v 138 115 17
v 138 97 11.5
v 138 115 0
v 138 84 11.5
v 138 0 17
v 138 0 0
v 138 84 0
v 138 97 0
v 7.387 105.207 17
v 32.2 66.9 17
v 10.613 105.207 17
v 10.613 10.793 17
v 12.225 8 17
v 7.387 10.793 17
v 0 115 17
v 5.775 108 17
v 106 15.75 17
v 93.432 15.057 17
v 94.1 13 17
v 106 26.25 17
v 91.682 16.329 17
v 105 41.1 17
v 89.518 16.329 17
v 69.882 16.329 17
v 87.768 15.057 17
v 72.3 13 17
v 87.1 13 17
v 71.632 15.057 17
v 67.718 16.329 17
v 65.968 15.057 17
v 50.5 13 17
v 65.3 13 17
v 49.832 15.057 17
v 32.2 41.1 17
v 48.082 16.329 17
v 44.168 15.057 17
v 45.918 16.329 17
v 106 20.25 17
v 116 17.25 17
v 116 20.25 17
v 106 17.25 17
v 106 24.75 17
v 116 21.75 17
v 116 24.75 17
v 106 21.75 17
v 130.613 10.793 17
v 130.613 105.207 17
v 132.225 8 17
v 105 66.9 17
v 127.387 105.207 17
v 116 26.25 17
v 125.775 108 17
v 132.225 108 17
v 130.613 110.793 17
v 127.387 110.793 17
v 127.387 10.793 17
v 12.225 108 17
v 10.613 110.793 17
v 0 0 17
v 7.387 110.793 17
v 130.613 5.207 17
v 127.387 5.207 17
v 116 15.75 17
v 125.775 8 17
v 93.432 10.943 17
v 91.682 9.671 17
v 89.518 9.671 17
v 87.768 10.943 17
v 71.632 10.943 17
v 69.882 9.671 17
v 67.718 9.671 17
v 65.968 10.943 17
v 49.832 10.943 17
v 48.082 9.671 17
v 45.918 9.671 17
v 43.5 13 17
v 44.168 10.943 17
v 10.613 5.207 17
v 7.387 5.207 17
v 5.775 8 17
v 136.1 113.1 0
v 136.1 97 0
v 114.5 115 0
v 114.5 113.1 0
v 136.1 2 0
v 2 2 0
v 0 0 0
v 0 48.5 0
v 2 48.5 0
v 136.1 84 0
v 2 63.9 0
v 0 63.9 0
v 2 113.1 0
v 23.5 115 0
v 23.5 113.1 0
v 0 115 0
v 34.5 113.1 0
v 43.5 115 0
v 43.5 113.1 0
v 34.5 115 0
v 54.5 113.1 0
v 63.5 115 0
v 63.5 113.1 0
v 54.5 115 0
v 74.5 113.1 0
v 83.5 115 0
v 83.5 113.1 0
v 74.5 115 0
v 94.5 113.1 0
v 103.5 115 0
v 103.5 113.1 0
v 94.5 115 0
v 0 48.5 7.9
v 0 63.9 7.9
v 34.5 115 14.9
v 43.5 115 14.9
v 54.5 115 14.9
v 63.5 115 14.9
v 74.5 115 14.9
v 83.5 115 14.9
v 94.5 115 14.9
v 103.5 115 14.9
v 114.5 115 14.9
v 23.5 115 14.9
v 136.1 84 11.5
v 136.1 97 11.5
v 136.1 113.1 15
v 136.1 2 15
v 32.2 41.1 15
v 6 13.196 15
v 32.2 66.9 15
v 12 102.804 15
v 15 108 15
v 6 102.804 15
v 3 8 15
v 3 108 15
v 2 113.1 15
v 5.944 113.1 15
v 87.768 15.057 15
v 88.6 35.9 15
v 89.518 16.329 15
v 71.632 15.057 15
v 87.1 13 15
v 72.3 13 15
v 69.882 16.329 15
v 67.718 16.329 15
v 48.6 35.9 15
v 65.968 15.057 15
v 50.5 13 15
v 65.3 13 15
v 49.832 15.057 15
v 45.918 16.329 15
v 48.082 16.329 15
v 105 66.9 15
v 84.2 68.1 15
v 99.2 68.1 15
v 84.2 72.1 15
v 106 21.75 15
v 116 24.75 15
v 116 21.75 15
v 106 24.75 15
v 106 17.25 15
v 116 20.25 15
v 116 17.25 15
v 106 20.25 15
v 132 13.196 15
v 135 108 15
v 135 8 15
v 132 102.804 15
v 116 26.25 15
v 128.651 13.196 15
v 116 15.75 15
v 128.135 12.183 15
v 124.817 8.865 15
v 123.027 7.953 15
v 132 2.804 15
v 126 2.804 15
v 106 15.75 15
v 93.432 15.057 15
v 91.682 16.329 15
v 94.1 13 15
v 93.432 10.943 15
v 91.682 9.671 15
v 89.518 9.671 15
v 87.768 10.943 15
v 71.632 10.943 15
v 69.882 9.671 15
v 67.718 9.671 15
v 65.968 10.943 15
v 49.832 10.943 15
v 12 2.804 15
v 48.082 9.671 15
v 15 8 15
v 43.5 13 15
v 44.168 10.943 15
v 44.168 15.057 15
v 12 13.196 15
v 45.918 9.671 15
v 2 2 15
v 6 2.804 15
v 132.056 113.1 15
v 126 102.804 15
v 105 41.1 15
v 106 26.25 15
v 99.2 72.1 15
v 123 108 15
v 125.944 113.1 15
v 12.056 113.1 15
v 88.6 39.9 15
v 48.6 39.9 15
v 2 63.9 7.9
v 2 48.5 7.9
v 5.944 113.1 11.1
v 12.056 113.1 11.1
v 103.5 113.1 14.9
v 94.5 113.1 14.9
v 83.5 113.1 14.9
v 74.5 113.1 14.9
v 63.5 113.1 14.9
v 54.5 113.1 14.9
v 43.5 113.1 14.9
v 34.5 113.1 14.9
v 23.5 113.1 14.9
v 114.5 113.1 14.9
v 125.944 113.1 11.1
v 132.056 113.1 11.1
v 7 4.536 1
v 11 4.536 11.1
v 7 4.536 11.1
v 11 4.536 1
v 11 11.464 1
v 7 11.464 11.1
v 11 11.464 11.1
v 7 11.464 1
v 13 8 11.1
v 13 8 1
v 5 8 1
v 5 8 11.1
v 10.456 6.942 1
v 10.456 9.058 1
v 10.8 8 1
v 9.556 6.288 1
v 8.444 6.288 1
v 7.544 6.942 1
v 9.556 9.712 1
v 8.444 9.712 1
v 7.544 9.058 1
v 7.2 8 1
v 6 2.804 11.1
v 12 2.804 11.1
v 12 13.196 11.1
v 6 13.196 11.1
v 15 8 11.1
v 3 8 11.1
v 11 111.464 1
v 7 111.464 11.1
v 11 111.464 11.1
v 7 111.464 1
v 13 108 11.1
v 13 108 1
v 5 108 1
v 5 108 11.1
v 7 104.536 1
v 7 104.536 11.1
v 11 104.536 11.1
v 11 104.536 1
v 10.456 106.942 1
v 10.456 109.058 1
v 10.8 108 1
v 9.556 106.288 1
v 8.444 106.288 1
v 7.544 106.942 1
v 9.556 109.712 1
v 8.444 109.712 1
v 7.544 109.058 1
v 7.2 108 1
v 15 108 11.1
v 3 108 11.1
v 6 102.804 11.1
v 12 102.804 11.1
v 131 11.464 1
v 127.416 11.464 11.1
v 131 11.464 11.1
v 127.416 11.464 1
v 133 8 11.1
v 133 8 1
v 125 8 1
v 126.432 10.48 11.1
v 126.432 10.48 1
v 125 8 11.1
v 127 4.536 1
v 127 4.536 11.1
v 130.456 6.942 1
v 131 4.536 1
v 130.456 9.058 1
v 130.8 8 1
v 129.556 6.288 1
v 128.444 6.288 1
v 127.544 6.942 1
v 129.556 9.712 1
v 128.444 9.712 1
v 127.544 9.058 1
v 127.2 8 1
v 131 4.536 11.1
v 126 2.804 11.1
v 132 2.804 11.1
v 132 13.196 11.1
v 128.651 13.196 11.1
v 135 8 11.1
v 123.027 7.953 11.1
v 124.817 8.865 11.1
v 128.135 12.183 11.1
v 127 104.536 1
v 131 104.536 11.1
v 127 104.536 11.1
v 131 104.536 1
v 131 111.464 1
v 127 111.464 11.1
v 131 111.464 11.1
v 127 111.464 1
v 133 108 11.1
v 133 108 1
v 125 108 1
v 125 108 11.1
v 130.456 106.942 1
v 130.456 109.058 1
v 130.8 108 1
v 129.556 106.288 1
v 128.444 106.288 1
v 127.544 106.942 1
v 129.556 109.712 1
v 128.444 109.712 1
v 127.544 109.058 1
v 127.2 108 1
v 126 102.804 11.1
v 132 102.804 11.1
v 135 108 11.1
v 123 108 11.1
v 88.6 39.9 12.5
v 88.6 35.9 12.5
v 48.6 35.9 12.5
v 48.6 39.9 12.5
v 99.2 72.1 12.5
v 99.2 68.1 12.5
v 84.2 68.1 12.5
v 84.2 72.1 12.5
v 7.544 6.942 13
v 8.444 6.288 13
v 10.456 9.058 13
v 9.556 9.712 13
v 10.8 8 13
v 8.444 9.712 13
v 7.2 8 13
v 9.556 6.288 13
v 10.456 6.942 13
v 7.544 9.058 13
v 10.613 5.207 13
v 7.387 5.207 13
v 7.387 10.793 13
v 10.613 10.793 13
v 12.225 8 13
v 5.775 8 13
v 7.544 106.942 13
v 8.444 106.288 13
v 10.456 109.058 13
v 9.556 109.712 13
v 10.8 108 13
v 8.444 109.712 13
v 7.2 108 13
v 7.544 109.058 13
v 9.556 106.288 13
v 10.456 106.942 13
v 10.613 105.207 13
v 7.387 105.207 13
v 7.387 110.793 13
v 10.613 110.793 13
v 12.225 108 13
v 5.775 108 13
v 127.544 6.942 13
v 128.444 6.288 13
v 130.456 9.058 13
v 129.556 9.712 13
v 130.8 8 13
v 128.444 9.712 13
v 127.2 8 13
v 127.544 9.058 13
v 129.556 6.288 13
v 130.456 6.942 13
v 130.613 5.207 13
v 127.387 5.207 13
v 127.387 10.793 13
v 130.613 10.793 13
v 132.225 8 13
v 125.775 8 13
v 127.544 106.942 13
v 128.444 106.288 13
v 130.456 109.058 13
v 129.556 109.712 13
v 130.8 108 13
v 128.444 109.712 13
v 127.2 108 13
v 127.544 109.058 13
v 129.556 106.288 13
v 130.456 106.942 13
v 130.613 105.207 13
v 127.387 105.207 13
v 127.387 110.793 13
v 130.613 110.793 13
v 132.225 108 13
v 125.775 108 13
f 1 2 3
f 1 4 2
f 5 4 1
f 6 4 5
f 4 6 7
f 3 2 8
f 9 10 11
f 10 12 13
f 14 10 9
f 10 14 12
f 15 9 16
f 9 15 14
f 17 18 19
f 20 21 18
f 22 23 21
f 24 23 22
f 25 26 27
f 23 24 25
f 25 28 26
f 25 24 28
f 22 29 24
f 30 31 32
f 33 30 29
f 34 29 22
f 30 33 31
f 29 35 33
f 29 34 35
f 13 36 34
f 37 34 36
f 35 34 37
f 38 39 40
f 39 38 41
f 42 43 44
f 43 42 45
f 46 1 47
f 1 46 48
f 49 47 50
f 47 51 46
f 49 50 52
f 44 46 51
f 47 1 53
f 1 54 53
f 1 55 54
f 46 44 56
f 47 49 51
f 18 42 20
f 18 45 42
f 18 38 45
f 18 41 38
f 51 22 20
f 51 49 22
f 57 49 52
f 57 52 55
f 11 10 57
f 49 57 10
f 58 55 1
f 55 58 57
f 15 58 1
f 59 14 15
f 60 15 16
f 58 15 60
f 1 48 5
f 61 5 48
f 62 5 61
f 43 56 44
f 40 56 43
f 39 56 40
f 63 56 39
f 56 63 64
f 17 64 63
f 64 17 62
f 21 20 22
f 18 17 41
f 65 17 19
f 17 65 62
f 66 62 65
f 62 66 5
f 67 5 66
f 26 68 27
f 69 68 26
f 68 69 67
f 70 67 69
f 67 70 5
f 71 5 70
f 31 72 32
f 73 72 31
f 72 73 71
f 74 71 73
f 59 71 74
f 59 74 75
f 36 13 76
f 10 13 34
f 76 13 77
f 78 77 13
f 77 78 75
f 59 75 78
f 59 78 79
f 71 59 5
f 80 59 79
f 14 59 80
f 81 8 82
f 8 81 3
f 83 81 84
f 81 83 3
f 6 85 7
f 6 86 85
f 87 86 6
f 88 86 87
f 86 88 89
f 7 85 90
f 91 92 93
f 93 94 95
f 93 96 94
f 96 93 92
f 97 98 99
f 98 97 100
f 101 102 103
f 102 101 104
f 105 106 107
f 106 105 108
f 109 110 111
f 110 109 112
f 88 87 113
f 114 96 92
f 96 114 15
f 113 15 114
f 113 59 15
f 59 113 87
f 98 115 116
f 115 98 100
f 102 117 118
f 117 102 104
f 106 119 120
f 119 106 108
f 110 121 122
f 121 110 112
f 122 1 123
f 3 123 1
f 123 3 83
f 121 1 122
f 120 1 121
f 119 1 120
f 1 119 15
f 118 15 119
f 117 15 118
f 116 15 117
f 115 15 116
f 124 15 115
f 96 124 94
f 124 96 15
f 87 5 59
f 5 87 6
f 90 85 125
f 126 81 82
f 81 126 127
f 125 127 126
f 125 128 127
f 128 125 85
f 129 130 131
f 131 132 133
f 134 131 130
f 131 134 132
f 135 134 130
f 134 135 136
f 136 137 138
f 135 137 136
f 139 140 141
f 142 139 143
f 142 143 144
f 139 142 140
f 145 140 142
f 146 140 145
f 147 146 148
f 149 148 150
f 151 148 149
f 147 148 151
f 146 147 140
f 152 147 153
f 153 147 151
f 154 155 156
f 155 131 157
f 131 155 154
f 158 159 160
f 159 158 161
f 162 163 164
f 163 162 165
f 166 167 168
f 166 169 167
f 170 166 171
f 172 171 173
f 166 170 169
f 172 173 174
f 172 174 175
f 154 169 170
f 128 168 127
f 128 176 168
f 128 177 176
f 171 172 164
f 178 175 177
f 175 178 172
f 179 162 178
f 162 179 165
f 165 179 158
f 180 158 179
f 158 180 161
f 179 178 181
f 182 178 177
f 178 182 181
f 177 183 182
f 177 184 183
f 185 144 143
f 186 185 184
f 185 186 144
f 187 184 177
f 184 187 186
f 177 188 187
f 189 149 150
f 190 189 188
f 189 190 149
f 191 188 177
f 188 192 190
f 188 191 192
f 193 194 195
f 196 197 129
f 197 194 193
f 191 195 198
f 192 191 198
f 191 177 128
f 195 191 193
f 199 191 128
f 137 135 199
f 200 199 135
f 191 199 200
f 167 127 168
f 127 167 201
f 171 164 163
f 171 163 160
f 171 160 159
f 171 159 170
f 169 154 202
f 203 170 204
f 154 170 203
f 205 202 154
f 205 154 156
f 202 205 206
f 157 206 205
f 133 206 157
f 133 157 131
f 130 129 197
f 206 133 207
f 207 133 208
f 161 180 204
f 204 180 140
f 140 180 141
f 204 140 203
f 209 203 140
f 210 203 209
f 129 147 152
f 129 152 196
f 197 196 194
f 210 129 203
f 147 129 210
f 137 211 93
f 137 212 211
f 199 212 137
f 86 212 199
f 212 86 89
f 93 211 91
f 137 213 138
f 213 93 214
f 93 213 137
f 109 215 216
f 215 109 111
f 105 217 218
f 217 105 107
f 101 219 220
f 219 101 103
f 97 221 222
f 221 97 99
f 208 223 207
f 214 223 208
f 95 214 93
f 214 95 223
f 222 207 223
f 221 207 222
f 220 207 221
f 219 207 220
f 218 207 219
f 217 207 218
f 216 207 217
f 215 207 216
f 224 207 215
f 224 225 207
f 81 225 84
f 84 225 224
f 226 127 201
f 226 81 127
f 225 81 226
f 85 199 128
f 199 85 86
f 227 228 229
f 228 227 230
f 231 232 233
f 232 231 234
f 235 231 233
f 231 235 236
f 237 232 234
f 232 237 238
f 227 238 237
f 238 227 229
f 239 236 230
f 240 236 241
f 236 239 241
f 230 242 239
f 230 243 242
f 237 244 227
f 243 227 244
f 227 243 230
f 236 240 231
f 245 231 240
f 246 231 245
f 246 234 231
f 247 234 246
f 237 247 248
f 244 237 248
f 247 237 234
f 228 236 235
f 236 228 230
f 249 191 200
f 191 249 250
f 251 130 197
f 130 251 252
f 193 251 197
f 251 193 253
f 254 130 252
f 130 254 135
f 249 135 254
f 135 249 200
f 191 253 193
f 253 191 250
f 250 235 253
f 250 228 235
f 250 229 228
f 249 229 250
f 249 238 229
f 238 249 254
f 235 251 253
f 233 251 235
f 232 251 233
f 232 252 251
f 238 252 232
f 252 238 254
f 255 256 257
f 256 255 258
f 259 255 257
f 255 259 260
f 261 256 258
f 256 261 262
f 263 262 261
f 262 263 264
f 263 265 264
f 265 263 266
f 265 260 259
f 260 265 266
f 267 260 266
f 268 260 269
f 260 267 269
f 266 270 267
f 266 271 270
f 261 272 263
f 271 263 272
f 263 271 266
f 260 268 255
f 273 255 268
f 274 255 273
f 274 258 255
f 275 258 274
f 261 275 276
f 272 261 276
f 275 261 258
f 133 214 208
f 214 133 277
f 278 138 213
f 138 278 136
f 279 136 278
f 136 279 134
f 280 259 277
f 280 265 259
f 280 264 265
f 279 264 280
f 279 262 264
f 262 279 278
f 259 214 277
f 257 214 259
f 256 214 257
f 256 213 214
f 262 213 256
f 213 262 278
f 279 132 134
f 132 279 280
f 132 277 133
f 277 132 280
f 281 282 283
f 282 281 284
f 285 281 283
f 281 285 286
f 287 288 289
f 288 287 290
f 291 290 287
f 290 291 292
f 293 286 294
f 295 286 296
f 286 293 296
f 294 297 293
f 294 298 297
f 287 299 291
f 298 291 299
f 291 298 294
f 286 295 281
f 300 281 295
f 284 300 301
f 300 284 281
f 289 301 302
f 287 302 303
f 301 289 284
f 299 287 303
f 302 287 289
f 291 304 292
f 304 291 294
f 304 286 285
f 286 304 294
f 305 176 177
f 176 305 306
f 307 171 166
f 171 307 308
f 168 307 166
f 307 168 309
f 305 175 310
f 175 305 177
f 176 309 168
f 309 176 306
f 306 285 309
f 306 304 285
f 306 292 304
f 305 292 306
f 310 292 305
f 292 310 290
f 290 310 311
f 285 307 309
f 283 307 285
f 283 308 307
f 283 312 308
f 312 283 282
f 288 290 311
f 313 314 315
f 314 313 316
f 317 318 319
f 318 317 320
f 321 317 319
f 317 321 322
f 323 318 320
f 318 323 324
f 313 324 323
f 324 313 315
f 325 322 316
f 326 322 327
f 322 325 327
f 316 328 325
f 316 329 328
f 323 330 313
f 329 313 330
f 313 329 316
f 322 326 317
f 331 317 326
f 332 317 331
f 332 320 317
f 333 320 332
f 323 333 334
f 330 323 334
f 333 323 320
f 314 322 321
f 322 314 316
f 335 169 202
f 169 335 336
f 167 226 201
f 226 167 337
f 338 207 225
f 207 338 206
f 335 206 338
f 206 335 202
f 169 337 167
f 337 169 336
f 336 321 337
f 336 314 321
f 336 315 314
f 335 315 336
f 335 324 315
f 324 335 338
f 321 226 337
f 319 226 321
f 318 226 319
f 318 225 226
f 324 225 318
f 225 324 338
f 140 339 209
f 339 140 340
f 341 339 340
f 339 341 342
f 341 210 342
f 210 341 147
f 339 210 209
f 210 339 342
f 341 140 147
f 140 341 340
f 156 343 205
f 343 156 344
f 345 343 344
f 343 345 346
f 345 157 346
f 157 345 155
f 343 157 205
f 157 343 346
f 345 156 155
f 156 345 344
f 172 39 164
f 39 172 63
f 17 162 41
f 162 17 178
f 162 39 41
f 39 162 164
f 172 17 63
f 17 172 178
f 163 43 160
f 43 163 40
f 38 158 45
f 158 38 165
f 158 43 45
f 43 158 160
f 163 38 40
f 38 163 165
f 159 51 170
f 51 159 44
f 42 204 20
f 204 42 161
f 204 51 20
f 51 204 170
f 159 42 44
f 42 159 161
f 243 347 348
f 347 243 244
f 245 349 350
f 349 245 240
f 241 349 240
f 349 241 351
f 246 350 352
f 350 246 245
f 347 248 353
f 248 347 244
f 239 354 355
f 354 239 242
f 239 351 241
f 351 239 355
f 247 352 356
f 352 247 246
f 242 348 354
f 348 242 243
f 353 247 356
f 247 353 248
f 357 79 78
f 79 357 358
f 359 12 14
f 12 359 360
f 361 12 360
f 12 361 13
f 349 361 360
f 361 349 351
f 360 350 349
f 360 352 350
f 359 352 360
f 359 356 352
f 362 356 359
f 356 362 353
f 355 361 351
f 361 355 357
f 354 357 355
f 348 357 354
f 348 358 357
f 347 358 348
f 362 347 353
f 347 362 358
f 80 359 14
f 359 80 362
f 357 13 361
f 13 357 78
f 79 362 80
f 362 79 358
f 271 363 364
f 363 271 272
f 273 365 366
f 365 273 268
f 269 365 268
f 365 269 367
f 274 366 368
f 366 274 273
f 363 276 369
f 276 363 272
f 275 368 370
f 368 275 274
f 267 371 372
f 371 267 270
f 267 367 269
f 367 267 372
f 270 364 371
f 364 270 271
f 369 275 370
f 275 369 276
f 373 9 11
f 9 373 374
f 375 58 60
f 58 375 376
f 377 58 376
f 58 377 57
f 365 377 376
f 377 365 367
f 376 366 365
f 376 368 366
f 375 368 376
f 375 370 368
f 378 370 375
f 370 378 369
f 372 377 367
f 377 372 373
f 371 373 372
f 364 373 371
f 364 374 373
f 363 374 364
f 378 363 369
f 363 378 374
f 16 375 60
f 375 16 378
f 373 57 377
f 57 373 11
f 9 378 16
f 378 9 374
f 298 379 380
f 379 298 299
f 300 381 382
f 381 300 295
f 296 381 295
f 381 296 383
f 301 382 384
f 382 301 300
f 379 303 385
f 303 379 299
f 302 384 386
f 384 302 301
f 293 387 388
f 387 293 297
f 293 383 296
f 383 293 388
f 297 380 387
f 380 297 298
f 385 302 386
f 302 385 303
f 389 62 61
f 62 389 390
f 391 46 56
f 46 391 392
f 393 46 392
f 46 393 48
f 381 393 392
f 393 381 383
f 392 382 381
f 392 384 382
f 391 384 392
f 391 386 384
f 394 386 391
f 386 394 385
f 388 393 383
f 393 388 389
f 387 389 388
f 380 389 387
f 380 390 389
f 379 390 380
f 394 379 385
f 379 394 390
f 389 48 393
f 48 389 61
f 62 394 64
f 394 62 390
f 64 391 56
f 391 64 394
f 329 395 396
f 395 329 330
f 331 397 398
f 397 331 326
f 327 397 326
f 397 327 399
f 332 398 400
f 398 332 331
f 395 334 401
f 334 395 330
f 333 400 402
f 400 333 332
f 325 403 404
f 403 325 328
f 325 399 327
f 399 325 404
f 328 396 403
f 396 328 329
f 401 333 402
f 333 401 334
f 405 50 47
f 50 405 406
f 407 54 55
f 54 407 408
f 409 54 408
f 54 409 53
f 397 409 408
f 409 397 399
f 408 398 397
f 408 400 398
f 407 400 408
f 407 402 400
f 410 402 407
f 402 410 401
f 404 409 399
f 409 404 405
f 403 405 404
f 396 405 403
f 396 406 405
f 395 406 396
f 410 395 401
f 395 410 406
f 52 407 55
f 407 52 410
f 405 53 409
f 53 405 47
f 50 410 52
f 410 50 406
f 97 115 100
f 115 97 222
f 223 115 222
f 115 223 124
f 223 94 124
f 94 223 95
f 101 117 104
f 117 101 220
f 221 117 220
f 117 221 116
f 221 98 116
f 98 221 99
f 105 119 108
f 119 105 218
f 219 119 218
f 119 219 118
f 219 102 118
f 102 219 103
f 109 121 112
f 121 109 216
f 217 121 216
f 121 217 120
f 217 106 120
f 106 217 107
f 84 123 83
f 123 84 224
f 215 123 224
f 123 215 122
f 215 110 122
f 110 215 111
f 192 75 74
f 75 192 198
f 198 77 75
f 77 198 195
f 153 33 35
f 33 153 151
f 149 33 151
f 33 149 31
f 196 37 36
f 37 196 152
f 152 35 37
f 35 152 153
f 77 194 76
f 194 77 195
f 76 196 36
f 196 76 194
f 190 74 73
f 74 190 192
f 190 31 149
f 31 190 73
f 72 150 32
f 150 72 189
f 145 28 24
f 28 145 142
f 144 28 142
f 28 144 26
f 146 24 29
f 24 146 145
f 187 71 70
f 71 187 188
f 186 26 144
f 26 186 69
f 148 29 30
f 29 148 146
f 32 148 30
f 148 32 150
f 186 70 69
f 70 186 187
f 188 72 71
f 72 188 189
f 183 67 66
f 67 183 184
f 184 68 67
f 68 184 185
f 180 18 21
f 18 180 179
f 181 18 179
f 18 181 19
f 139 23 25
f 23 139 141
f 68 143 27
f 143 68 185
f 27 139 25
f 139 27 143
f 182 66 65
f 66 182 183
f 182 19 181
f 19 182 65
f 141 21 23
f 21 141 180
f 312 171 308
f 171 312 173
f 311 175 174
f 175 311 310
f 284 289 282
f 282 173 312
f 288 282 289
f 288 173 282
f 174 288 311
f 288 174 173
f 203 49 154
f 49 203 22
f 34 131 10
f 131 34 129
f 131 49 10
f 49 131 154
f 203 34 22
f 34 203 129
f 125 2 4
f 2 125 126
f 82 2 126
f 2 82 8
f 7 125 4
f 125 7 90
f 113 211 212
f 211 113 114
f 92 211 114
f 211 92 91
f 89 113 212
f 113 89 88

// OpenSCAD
tol = 0.5;
screen_tol = 0.8;
pcb_x = 130;
pcb_y = 110;
pcb_z = 4;
bolt_d = 3.6;
shift_bolt = 5;

// box thickness
th = 2;

shift_x = 4;
shift_y = th + 1;

box_x = pcb_x + shift_x + 4;
box_y = pcb_y + shift_y + th;

pcb_width = 2;
pcb_up = 9;

box_z = th + pcb_up + pcb_width - 1;

socket_h = 15;
socket_w = 10;
socket_n = 5;
socket_int = 20;
start_socket_x = 20 + shift_x;
eps = 1e-1;

usb_type_b_w = 12;
usb_type_b_h = 11;
start_type_b_y = shift_y + 81.5;
//start_type_b_z = th + pcb_z + tol;

usb_type_a_w = 14.4;
usb_type_a_h = 7.8;
start_type_a_y = shift_y + 46;
//start_type_a_z = th + pcb_z + tol;

// programmator
micro_x = 10;
micro_y = 21.1;
micro_start_x = shift_x + 4.75;
micro_start_y = shift_y + pcb_y - 23.3 - micro_y;

contrast_start_x = shift_x + 38.4;
contrast_start_y = shift_y + 25.7;
volume_start_x = shift_x + pcb_x - 39.2;
volume_start_y = contrast_start_y;
pot_d = 7;
under_pcb = 13;
fn = 10;
gaika_h = 4;
gaika_w = 5.5;
stoiki_r = 4;
wide_stoiki_r = stoiki_r + 2;



translate([0,0,-50]) {

difference() {
  union() {
    difference() {
      cube([box_x,box_y,box_z], false);
      translate([th, th, th]) {
        cube([box_x-2*th+eps, box_y-2*th+eps, box_z-th+eps], false);
      }
    }
    // under_pcb, stoiki
    for (dy = [shift_y+shift_bolt, shift_y+pcb_y-shift_bolt]) {
      for (dx = [shift_x+shift_bolt, shift_x+pcb_x-shift_bolt]) {
//        translate([dx,dy,pcb_up/2+th-eps]) {
//          cube(size=[under_pcb,under_pcb,pcb_up], center=true);
//        }
        translate([dx,dy,th-eps]) {
          cylinder($fn=6, r=stoiki_r, h=pcb_up);
          cylinder($fn=6, r=wide_stoiki_r, h=gaika_h);
        }
      }
    }
    translate([box_x/2, box_y/2, th-eps]) {
      cylinder($fn=6, r=stoiki_r, h=pcb_up);
    }
  }

  // bolts
  for (dx = [shift_x+shift_bolt, shift_x+pcb_x-shift_bolt]) {
    for (dy = [shift_y+shift_bolt, shift_y+pcb_y-shift_bolt]) {
      translate([dx,dy,-eps]) {
        cylinder($fn=fn, r=bolt_d/2, h=th+pcb_up+2*eps);
        // gaika
        cylinder($fn=6, r=gaika_w / 2 / cos(30) + 0.05, h=gaika_h);
      }
    }
  }

//    // usb_in1 type b
//    translate([box_x-th-eps, start_type_b_y-tol, start_type_b_z]) {
//        cube(size=[th+2*eps, usb_type_b_w+2*tol, box_z]);
//    }

//    // usb_out1 type a
//    translate([-eps, start_type_a_y - tol, start_type_a_z]) {
//        cube(size=[th+2*eps, usb_type_a_w + 2*tol, box_z]);
//    }

    // programmator
    translate([micro_start_x-tol,micro_start_y-tol, -eps]) {
      cube(size=[micro_x+2*tol, micro_y+2*tol, th+2*eps]);
    }

    // contrast
    translate([contrast_start_x, contrast_start_y, -eps]) {
      cylinder($fn=fn, r=pot_d/2, h=th+2*eps);
    }

    // volume
//    translate([volume_start_x, volume_start_y, -eps]) {
//      cylinder($fn=20, r=pot_d/2, h=th+2*eps);
//    }
}
}

top_box_z = 15 + th;
stoiki_h = top_box_z - th;
wide_stoiki_h = 4;
pcb_room = 1;
screen_start_x = shift_x + 29;
screen_start_y = shift_y + 38.9;
screen_length_x = 71.2;
screen_length_y = 24.2;
screen_hold_x = 40;
screen_hold_y = 4;
screen_hold_start_z = 12.5;
screen_hold_y_shift = 2;
screen_hold_up_x = 15;
screen_hold_up_x_shift = 5;

master_button_y = shift_y + 10;
master_button_x = shift_x + 43;
master_button_int = 21.8;
master_button_r = 3;
top_bolt_h = 1.5;
top_bolt_r = 3.5;
speaker_shift = 18;
speaker_r = 15;
speaker_h = 15;
speaker_hole_d = 10;
speaker_hole_int = 3;
speaker_hole_w = 1.5;
speaker_shift = 18;

!difference() {
  union() {
    difference() {
      cube([box_x,box_y,top_box_z], false);
      translate([th, th, -eps]) {
        cube([box_x-2*th+eps, box_y-2*th+eps, top_box_z-th+eps], false);
      }
    }
    // stoiki
    for (dx = [shift_x+shift_bolt, shift_x+pcb_x-shift_bolt]) {
      for (dy = [shift_y+shift_bolt, shift_y+pcb_y-shift_bolt]) {
        translate([dx,dy,pcb_room]) {
          cylinder($fn=6, r=stoiki_r, h=top_box_z-th+eps);
        }
        translate([dx,dy,top_box_z-th-wide_stoiki_h+eps]) {
          cylinder($fn=6, r=wide_stoiki_r, h=wide_stoiki_h+th-2*eps);
        }
      }
    }
    // screen_hold
    translate([screen_start_x + (screen_length_x - screen_hold_x)/2, screen_start_y - screen_hold_y_shift - screen_hold_y, screen_hold_start_z]) {
	cube([screen_hold_x, screen_hold_y, top_box_z - screen_hold_start_z - th + eps]);
    }
    translate([screen_start_x + screen_length_x - screen_hold_up_x - screen_hold_up_x_shift, screen_start_y + screen_length_y + screen_hold_y_shift, screen_hold_start_z]) {
	cube([screen_hold_up_x, screen_hold_y, top_box_z - screen_hold_start_z - th + eps]);
    }
  }
  // - speaker na stoikah
  translate([shift_x + pcb_x - 18, shift_y + 18, 0]) {
    cylinder(r=speaker_r, h = 15, $fn=20);
  }
  // speaker_hole
  for (dy = [shift_y + speaker_shift - speaker_hole_int - speaker_hole_w*3/2, 
             shift_y + speaker_shift - speaker_hole_w/2, 
             shift_y + speaker_shift + speaker_hole_int + speaker_hole_w/2]) { 
    translate([shift_x + pcb_x - speaker_shift - speaker_hole_d, dy, top_box_z-th-eps]) {
      cube(size=[speaker_hole_d, speaker_hole_w, th + 2*eps]);
    }
  }

  // bolts
  for (dx = [shift_x+shift_bolt, shift_x+pcb_x-shift_bolt]) {
    for (dy = [shift_y+shift_bolt, shift_y+pcb_y-shift_bolt]) {
      translate([dx,dy,-eps]) {
        cylinder($fn=fn, r=bolt_d/2, h=top_box_z+2*eps);
      }
      translate([dx, dy, top_box_z - wide_stoiki_h]) {
        cylinder($fn=6, r=gaika_w / 2 / cos(30) + 0.05, h=wide_stoiki_h+eps);
        //cylinder($fn=6, r=top_bolt_r, h=top_bolt_h + eps);
      }
    }
  }

  // screen
  translate([screen_start_x - screen_tol, screen_start_y - screen_tol, top_box_z - th - eps]) {
      cube([screen_length_x + 2*screen_tol, screen_length_y + 2*screen_tol, th + 2*eps]);
  }
  // sockets
  for (i = [0:1:socket_n-1]) {
      translate([start_socket_x+i*socket_int - tol, box_y-th-eps, -eps]) {
        cube(size=[socket_w + 2*tol, th+2*eps, socket_h]);
      }
  }
  // type_b
  translate([box_x - th - eps, start_type_b_y - tol, -tol]) {
      cube([th + 2*eps, usb_type_b_w + 2*tol, usb_type_b_h + 2*tol]);
  }
  // type_a
  translate([-eps, start_type_a_y - tol, -eps]) {
      cube([th + 2*eps, usb_type_a_w + 2*tol, usb_type_a_h + 2*eps]);
  }
  // master buttons
  for (i = [0:1:2]) {
    dx = master_button_x + master_button_int*i;
    translate([dx, master_button_y, top_box_z - th - eps]) {
      cylinder($fn=fn, r=master_button_r + tol, h=th+2*eps);
    }
  }
}


//// bolts
//for (dx = [shift_x+shift_bolt, shift_x+pcb_x-shift_bolt]) {
//  for (dy = [shift_y+shift_bolt, shift_y+pcb_y-shift_bolt]) {
//    difference() {
//      translate([dx,dy,pcb_up/2+th]) {
//        cube(size=[a,a,pcb_up], center=true);
//      }
//      translate([dx,dy,-eps]) {
//        cylinder($fn=20, r=bolt_d/2, h=th+pcb_up+2*eps);
//      }
//    }
//  }
//}


//leg_r = t;
//shift = t/2+leg_r;
//for (dx = [shift, a-shift])
//    for (dy = [shift, b-shift]) {
//        translate([dx, dy, 0]) {
//            cylinder(h=c, r=leg_r, $fn=40);
//        }
//    }
